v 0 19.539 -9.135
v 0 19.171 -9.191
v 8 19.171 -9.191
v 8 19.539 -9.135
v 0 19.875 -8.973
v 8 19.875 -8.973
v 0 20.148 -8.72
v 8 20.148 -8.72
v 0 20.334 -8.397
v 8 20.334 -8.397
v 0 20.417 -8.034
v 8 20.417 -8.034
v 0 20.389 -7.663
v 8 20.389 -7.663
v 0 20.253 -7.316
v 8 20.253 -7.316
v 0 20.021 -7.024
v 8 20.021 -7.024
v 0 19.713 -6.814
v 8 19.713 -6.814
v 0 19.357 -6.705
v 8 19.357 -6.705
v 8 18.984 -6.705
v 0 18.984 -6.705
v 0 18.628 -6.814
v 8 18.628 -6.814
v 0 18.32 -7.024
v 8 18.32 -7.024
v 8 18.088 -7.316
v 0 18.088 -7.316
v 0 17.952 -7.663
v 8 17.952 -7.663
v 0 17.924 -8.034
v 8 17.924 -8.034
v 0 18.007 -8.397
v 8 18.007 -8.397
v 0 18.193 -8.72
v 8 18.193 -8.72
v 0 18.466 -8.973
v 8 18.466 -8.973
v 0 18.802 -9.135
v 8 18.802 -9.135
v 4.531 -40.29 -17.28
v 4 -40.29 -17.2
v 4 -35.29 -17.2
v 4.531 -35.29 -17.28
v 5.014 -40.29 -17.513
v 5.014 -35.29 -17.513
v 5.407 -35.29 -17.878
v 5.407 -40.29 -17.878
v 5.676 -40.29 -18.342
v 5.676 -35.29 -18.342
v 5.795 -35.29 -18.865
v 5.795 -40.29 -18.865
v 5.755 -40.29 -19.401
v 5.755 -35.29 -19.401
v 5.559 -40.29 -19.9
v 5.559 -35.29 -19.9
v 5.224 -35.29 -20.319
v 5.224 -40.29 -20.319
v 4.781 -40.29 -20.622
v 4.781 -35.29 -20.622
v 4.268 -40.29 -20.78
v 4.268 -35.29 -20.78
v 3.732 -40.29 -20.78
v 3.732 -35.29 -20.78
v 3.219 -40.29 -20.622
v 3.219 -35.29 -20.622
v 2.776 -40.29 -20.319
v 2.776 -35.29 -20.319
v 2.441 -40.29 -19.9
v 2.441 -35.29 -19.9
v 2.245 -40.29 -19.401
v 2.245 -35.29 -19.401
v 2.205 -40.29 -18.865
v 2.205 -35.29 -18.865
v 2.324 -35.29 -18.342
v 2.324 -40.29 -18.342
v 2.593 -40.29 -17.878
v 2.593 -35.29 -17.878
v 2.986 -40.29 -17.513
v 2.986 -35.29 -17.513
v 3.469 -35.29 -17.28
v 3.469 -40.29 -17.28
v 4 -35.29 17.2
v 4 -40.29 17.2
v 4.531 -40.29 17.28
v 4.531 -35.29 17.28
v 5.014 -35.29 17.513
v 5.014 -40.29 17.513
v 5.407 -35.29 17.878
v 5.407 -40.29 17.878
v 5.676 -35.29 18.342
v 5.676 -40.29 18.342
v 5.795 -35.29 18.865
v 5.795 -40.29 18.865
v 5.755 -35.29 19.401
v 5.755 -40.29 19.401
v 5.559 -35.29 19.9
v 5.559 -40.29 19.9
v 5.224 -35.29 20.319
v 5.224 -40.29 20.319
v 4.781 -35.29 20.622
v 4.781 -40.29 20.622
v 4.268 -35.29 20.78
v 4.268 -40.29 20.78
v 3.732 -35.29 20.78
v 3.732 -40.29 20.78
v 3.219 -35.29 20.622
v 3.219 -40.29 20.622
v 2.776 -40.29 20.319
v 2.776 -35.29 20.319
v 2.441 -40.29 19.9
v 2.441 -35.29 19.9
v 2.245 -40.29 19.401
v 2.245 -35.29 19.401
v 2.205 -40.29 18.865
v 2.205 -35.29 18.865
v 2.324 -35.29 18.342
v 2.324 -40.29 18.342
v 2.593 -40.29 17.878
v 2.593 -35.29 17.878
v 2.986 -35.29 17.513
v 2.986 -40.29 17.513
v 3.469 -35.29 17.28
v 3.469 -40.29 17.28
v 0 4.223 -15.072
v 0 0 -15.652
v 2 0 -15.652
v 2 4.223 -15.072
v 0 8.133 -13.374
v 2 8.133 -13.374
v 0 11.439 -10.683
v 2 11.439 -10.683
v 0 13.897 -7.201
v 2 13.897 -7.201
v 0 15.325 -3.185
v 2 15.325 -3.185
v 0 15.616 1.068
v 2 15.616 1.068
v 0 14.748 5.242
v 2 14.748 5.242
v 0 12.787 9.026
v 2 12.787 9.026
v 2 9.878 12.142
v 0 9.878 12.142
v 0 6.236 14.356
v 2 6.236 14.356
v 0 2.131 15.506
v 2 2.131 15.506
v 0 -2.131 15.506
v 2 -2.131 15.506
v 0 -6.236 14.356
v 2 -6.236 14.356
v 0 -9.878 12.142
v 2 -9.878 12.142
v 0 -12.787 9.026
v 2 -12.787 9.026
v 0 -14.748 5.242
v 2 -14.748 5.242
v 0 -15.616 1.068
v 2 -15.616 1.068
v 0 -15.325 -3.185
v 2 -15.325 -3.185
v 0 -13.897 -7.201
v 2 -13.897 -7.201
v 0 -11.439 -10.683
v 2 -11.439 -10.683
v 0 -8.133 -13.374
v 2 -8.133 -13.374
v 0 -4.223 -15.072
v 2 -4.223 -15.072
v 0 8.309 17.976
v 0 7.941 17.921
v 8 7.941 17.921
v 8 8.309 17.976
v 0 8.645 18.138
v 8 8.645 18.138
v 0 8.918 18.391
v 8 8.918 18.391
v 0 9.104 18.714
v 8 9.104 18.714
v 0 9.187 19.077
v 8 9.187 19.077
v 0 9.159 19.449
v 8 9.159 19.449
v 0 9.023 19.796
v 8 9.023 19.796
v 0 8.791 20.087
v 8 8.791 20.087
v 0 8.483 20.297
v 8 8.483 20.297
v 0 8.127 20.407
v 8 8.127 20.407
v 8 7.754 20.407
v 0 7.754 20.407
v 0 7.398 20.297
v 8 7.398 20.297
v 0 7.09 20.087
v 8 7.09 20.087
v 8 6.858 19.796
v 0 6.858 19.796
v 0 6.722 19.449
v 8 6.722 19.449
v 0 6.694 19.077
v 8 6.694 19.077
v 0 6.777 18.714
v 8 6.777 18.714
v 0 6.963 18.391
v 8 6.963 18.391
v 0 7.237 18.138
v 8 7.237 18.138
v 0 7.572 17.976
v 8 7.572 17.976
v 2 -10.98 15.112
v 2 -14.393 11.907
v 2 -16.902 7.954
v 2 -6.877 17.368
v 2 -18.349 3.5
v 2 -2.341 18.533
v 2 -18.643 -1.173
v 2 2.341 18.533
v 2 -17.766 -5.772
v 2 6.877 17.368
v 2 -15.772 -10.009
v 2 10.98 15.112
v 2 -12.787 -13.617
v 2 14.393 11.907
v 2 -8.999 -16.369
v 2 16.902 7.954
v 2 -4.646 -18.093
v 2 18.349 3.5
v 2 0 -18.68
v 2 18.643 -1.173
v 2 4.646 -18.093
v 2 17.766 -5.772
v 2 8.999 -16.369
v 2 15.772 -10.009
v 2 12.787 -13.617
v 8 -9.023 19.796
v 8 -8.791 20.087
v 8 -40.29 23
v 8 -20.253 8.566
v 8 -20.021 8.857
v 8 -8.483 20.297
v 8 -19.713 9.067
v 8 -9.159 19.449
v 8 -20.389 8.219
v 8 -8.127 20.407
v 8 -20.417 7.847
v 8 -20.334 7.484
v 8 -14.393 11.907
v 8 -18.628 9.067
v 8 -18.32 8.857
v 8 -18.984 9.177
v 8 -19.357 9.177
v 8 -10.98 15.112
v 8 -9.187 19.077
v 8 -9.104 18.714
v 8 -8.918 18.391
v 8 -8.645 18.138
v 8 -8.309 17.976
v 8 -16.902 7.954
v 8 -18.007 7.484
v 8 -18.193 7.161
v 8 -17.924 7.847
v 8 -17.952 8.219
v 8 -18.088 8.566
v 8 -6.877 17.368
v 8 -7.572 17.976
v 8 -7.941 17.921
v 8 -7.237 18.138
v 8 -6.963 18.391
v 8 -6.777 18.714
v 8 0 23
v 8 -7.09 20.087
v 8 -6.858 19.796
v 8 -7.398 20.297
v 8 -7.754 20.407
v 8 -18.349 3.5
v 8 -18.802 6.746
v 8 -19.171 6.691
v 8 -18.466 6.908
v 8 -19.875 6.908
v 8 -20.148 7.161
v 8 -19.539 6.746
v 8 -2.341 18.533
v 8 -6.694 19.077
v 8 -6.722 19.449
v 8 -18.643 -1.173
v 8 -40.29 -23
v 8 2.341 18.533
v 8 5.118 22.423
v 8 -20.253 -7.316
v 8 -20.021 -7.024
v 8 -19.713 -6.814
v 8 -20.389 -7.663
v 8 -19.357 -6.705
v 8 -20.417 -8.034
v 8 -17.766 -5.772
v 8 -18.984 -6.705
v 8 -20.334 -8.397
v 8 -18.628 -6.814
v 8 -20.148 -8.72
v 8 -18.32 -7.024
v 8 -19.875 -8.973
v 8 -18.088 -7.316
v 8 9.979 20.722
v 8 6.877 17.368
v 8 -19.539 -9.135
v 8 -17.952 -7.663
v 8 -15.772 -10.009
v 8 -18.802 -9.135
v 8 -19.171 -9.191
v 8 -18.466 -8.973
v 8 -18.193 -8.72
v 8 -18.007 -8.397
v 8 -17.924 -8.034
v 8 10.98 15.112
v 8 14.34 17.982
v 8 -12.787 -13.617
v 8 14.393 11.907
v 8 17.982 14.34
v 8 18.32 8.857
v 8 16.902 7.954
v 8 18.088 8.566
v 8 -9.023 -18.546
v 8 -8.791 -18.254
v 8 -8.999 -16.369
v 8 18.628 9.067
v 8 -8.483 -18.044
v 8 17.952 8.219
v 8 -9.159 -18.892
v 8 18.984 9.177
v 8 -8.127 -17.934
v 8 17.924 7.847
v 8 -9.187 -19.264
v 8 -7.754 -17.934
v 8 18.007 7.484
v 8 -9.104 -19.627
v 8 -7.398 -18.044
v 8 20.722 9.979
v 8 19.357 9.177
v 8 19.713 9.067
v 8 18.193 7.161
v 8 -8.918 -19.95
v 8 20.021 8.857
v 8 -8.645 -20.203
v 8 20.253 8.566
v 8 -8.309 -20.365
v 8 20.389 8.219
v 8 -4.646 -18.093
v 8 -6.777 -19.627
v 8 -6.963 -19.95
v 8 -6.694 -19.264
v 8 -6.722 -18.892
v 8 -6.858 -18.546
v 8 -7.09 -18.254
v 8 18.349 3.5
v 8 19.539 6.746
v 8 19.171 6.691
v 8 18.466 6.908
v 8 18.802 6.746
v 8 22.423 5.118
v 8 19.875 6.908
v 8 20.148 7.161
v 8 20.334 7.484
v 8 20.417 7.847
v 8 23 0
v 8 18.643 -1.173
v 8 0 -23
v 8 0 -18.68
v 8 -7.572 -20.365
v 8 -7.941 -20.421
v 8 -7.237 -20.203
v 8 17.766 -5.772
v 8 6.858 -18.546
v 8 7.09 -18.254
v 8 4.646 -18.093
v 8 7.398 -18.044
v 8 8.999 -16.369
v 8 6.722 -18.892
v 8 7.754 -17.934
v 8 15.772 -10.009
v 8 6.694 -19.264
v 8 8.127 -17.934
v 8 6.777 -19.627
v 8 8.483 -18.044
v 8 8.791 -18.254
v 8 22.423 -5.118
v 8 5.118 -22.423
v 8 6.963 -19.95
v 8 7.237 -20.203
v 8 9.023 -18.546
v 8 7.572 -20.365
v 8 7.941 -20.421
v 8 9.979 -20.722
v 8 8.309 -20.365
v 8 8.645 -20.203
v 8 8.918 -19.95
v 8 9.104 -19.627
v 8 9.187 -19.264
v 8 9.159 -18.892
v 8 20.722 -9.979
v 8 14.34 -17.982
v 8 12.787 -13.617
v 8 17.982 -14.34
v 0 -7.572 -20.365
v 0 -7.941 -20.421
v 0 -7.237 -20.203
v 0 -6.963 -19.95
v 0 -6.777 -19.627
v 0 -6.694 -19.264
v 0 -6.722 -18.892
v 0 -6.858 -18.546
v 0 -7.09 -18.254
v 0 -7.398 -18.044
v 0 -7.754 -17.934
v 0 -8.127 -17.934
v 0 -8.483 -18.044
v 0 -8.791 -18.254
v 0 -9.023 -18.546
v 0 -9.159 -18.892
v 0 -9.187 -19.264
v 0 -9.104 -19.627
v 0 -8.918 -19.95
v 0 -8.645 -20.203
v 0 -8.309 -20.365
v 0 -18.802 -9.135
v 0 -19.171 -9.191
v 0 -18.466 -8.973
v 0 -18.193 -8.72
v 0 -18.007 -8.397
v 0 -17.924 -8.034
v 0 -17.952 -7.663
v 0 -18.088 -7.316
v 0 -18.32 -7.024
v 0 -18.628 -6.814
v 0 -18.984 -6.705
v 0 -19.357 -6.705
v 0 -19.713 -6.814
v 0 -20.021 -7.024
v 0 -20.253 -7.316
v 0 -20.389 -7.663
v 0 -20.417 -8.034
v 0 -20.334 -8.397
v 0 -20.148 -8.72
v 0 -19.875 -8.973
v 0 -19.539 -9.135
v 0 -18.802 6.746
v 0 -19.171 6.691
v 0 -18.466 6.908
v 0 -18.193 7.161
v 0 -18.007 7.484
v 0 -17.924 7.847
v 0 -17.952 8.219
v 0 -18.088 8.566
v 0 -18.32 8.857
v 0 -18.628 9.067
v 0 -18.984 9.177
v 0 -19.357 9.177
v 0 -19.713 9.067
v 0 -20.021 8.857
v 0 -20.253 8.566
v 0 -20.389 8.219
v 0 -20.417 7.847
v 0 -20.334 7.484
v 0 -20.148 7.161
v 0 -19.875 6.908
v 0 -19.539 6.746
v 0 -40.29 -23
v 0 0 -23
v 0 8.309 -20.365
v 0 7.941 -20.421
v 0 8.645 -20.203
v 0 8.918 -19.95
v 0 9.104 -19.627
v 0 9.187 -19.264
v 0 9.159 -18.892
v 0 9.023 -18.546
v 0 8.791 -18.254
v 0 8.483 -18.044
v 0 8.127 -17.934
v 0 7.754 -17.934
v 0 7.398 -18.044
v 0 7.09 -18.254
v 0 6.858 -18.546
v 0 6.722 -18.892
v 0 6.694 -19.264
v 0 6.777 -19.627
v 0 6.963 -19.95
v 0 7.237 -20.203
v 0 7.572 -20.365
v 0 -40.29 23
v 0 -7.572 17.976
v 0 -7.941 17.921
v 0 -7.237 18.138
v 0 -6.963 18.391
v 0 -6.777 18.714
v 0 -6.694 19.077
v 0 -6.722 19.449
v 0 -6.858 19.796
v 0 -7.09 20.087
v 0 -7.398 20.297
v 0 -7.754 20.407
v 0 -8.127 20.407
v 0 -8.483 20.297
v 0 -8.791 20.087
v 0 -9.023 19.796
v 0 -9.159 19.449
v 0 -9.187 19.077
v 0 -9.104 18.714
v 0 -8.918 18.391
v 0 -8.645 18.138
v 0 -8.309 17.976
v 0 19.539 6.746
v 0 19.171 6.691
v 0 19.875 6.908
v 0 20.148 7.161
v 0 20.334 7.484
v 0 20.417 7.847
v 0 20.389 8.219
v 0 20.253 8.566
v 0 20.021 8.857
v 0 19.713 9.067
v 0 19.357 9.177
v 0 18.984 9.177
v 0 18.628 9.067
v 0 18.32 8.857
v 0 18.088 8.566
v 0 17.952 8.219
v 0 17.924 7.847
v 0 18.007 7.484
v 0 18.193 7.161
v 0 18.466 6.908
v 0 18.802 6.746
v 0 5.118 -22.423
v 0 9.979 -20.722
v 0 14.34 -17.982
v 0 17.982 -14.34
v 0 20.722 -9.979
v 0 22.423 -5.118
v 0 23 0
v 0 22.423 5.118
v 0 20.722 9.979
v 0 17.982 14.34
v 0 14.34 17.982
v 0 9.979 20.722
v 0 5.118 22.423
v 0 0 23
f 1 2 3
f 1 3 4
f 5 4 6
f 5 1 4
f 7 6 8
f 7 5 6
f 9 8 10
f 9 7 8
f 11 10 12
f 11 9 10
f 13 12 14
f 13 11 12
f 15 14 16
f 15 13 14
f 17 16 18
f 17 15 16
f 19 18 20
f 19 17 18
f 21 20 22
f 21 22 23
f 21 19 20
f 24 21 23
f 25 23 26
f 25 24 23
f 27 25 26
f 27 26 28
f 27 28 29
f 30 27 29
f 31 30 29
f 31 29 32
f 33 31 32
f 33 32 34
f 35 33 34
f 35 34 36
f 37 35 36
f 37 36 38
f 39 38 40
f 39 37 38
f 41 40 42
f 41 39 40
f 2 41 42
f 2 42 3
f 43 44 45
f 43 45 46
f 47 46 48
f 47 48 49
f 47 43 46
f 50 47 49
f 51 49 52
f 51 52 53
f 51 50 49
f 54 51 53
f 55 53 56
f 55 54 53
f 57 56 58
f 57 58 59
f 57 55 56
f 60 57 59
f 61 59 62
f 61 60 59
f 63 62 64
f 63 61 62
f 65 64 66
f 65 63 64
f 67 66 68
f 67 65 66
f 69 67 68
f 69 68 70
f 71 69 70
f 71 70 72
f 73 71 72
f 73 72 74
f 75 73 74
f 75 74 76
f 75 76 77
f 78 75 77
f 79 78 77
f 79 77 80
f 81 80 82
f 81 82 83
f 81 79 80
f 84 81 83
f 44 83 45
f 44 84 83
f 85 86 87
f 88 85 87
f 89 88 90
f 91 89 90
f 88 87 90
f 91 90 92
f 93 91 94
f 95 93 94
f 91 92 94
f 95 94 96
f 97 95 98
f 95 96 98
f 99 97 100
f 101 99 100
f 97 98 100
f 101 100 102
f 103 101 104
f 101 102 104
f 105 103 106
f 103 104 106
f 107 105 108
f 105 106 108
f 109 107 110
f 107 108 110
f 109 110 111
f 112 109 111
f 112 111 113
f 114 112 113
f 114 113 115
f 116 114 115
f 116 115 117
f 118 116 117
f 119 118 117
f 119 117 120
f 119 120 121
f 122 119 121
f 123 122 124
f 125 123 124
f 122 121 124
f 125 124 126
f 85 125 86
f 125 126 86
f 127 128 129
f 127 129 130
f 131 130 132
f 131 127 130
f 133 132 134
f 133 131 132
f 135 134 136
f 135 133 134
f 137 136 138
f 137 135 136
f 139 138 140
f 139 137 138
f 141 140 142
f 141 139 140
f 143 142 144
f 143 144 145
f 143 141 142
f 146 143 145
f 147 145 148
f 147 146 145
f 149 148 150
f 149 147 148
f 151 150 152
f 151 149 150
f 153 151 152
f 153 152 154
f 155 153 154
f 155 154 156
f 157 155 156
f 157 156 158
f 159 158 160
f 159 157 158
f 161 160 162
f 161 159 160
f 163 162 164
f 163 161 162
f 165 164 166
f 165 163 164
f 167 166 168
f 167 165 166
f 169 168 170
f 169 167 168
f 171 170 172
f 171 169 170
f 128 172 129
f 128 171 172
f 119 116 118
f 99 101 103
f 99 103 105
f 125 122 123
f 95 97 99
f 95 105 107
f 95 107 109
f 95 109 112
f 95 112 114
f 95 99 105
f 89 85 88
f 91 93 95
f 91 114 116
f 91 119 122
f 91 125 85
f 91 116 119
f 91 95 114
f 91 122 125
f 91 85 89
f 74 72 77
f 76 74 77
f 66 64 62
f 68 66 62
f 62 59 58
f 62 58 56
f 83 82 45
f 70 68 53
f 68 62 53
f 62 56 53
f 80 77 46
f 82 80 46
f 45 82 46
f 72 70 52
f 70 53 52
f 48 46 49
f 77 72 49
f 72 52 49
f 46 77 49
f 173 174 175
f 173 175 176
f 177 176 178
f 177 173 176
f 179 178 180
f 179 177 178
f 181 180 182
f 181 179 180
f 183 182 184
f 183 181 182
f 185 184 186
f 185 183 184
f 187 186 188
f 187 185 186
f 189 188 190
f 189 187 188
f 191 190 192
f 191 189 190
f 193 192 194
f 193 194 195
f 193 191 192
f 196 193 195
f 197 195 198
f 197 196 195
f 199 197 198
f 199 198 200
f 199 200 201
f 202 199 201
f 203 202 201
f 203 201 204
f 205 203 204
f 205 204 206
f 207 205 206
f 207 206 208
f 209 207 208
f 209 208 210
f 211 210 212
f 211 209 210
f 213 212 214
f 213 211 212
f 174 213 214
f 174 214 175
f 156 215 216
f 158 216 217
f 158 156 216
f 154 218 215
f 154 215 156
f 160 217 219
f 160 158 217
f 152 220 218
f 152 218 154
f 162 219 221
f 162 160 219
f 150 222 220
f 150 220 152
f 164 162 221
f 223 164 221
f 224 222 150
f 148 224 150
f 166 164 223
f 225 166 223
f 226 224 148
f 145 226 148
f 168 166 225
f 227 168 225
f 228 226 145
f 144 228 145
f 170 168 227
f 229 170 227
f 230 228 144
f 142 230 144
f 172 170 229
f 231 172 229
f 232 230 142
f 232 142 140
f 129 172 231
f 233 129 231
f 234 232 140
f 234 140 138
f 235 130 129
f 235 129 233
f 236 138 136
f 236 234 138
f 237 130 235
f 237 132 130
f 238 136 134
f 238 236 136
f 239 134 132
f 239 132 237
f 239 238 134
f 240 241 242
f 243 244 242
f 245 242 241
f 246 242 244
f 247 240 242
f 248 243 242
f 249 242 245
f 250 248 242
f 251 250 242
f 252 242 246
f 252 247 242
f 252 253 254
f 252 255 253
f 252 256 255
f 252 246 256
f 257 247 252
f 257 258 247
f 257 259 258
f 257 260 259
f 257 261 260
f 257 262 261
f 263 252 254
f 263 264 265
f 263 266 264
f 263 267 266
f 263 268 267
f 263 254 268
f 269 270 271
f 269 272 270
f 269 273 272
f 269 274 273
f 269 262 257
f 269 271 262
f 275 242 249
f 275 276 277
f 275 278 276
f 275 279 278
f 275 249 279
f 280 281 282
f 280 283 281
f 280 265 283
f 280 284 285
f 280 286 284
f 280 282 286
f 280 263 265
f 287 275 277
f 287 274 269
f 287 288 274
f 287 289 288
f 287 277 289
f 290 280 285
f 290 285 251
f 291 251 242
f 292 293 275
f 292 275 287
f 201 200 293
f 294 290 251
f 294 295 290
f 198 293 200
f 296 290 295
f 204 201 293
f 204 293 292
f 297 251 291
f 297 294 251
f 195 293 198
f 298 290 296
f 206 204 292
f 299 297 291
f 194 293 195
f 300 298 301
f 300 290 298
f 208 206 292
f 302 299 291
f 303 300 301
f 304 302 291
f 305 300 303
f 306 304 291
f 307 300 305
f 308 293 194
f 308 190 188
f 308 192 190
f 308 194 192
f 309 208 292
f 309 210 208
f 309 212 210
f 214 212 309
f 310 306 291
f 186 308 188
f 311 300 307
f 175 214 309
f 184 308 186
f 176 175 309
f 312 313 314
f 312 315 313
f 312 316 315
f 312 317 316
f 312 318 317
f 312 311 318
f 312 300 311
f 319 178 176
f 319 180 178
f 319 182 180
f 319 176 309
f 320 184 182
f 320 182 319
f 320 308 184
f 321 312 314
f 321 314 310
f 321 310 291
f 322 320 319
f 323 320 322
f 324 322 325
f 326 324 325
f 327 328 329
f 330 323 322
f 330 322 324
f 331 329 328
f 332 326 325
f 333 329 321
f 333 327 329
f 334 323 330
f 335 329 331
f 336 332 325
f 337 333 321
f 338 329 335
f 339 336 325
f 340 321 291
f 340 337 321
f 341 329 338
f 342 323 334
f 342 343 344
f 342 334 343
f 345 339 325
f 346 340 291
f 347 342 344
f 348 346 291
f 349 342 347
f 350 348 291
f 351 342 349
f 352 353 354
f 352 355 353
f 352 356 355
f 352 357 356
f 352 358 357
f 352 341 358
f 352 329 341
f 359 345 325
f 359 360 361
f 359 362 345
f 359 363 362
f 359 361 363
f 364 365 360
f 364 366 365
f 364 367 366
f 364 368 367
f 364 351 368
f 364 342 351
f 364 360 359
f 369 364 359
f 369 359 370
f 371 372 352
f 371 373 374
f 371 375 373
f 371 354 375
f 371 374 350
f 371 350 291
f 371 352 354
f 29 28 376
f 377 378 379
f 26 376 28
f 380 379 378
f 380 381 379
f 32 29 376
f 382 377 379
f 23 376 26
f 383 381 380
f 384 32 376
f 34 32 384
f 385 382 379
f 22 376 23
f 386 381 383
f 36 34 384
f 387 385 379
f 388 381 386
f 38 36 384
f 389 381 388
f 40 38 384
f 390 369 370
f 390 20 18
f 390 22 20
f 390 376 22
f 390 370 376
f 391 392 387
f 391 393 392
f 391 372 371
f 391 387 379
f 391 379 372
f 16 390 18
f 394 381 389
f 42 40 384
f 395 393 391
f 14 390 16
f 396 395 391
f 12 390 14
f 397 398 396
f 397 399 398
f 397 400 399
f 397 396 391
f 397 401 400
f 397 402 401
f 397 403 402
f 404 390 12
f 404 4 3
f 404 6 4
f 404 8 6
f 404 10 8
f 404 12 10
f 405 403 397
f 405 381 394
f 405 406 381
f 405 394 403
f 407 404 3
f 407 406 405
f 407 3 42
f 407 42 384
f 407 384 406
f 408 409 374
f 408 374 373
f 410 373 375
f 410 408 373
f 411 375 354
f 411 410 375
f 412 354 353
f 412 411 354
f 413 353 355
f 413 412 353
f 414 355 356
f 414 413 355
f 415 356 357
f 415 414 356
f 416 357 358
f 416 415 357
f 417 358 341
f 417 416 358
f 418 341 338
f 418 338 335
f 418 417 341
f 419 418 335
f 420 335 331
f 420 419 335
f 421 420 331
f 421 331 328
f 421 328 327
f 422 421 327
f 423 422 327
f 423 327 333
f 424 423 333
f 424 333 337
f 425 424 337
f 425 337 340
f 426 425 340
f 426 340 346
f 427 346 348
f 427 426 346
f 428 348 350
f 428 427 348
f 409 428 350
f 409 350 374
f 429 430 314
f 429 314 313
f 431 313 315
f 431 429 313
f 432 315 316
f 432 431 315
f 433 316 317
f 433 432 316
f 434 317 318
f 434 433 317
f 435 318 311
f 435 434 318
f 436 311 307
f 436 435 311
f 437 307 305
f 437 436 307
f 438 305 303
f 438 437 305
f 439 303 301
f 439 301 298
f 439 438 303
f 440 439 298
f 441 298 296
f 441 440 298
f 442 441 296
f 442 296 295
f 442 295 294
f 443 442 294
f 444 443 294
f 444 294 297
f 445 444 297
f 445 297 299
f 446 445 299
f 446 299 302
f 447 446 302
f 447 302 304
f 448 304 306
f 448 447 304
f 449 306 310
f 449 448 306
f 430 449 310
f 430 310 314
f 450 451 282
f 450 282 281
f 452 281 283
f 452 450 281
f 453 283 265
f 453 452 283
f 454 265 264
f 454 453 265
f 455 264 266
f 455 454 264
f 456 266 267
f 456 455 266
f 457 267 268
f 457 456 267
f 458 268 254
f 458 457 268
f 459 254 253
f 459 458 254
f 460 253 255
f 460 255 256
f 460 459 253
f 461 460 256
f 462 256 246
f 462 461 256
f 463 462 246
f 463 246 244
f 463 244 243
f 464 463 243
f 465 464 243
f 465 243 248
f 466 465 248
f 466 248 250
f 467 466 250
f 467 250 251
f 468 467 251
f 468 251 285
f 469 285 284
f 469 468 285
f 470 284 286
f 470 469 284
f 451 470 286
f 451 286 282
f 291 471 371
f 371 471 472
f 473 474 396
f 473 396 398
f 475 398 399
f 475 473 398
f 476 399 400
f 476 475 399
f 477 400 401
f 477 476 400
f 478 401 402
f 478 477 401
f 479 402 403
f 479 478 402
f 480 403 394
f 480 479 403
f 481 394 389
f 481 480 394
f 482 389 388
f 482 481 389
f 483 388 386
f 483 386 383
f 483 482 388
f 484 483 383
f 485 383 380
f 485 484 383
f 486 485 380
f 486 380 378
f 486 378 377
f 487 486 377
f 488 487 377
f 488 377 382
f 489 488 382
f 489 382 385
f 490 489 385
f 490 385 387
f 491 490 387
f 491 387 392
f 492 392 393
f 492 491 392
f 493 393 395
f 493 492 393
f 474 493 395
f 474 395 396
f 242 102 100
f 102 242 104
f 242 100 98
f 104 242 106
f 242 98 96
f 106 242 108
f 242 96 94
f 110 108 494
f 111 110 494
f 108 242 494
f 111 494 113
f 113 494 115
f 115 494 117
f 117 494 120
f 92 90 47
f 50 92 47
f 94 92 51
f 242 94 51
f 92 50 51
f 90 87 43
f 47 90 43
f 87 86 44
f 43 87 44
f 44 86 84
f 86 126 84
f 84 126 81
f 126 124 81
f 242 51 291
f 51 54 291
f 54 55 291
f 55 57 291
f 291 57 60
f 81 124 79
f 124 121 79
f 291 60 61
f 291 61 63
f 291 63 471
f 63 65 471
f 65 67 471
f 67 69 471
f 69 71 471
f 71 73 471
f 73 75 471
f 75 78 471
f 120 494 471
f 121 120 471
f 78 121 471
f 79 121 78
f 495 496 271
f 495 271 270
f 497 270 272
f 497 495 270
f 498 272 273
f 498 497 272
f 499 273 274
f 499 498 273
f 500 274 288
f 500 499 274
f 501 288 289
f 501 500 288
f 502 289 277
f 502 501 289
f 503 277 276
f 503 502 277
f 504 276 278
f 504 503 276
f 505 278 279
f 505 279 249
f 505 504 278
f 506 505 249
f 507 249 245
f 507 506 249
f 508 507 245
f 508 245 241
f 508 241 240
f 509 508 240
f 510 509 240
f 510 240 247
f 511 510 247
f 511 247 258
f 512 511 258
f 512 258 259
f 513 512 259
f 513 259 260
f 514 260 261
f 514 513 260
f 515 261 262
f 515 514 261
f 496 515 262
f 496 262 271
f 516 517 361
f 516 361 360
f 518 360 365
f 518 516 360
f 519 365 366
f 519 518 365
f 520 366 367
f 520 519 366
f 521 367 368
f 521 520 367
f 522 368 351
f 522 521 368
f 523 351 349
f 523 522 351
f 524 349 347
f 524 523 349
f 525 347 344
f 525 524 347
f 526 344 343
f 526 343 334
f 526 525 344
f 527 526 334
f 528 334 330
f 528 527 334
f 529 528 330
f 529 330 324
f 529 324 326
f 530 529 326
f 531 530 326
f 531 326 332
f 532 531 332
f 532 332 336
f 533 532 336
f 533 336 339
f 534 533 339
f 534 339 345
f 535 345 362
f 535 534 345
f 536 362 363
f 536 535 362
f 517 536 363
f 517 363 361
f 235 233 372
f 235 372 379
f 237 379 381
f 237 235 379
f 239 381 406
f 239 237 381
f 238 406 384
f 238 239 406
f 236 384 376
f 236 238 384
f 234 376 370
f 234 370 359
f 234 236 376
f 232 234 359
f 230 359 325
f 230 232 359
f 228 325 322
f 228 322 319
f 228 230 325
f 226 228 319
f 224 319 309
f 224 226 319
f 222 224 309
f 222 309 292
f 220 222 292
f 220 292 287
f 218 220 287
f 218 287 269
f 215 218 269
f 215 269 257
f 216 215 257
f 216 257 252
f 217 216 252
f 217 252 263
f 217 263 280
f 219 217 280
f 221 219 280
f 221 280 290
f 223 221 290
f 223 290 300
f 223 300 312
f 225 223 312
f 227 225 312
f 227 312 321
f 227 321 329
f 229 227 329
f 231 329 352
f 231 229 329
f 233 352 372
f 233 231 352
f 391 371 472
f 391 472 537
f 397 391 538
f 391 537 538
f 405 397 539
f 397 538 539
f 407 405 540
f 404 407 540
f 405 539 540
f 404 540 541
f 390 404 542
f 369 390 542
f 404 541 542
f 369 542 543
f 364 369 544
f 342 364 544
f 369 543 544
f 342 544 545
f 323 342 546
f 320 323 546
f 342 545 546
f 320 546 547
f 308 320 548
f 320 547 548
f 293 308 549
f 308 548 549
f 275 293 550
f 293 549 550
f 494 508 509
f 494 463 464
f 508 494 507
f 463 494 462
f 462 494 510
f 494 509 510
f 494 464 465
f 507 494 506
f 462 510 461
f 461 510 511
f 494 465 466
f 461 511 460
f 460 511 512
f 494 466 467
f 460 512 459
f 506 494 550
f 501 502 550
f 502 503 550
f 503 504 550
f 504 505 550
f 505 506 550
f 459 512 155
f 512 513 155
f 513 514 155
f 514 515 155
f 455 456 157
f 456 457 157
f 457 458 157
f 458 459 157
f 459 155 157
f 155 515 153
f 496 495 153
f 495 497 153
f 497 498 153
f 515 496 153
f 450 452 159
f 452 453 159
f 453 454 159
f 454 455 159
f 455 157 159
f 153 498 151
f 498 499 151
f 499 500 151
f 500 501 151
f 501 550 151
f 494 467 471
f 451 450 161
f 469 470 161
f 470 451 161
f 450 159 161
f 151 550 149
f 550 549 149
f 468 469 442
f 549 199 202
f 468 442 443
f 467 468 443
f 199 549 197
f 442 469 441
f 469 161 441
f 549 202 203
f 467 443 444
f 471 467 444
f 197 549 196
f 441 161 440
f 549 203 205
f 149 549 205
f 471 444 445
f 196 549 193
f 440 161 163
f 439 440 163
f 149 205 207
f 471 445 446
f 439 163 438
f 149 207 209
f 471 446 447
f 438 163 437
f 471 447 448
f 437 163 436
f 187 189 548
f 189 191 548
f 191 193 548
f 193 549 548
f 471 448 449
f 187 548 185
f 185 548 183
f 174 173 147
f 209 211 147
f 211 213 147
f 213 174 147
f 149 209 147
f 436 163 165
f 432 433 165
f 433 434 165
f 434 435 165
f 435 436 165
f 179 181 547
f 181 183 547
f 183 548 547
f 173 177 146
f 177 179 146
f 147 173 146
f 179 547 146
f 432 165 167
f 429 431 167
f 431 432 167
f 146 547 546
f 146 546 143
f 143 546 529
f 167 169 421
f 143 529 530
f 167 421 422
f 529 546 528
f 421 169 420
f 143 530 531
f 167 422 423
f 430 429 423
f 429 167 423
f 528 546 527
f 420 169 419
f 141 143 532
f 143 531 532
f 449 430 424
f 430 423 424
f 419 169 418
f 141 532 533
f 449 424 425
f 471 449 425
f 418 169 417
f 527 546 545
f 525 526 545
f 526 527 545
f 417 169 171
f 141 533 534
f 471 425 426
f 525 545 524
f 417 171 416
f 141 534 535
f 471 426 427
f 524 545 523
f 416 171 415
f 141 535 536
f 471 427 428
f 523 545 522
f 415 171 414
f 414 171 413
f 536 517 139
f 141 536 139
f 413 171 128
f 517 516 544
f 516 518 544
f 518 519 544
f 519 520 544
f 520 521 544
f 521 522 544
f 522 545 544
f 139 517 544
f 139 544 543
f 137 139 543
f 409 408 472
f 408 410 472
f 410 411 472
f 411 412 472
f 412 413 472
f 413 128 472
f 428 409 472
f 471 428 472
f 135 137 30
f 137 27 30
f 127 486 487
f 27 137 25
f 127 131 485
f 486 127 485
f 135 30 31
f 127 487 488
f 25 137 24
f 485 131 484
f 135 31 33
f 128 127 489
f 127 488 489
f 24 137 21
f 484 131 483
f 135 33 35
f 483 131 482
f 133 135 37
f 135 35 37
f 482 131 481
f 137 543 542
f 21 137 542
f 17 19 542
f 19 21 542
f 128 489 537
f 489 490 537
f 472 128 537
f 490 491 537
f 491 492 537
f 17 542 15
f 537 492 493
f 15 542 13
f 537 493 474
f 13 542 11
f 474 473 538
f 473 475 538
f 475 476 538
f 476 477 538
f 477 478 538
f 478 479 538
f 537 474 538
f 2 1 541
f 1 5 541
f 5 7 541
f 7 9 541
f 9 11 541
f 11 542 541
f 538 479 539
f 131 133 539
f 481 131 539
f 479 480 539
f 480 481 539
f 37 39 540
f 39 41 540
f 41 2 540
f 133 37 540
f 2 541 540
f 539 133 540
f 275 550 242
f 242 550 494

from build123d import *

# Parameters (mm, degrees)
SKETCH_1_R          = 18.68
SKETCH_1_R_2        = 15.652173913
EXTRUDE_2_DEPTH     = 2
SKETCH_1_4_R        = 23
SKETCH_1_4_R_2      = 1.25
SKETCH_1_4_R_3      = 18.68
EXTRUDE_3_DEPTH     = 8
EXTRUDE_4_DEPTH     = 8
SKETCH_3_R          = 1.8
CUT_EXTRUDE_1_DEPTH = 5


with BuildPart() as part:
    # 草图1 → 凸台-拉伸2 (new body)
    with BuildSketch(Plane(origin=(0, 0, 0), x_dir=(0, 0, -1), z_dir=(1, 0, 0))):
        Circle(SKETCH_1_R)
        Circle(SKETCH_1_R_2, mode=Mode.SUBTRACT)
    extrude(amount=EXTRUDE_2_DEPTH)

    # 草图1<4> → 凸台-拉伸3 (add)
    with BuildSketch(Plane(origin=(0, 0, 0), x_dir=(0, 0, -1), z_dir=(1, 0, 0))):
        Circle(SKETCH_1_4_R)
        with Locations((-7.940681222, -19.1705003)):
            Circle(SKETCH_1_4_R_2, mode=Mode.SUBTRACT)
        with Locations((-19.1705003, -7.940681222)):
            Circle(SKETCH_1_4_R_2, mode=Mode.SUBTRACT)
        with Locations((7.940681222, -19.1705003)):
            Circle(SKETCH_1_4_R_2, mode=Mode.SUBTRACT)
        with Locations((19.1705003, -7.940681222)):
            Circle(SKETCH_1_4_R_2, mode=Mode.SUBTRACT)
        with Locations((-19.1705003, 7.940681222)):
            Circle(SKETCH_1_4_R_2, mode=Mode.SUBTRACT)
        with Locations((-7.940681222, 19.1705003)):
            Circle(SKETCH_1_4_R_2, mode=Mode.SUBTRACT)
        Circle(SKETCH_1_4_R_3, mode=Mode.SUBTRACT)
        with Locations((19.1705003, 7.940681222)):
            Circle(SKETCH_1_4_R_2, mode=Mode.SUBTRACT)
        with Locations((7.940681222, 19.1705003)):
            Circle(SKETCH_1_4_R_2, mode=Mode.SUBTRACT)
    extrude(amount=EXTRUDE_3_DEPTH)

    # 草图2 → 凸台-拉伸4 (add)
    with BuildSketch(Plane.ZY):
        with BuildLine():
            Line((-23, -40.29), (-23, 0))
            ThreePointArc((-23, 0), (0, -23), (23, 0))
            Line((23, 0), (23, -40.29))
            Line((23, -40.29), (-23, -40.29))
        make_face()
    extrude(amount=-EXTRUDE_4_DEPTH)

    # 草图3 → 切除-拉伸1 (cut)
    with BuildSketch(Plane.XZ.offset(40.29)):
        with Locations((4, 19)):
            Circle(SKETCH_3_R)
    cut_extrude_1 = extrude(amount=-CUT_EXTRUDE_1_DEPTH, mode=Mode.SUBTRACT)

    # 镜向1: 切除-拉伸1 across plane
    add(cut_extrude_1.mirror(Plane(origin=(0, 0, 0), x_dir=(1, 0, 0), z_dir=(0, 0, -1))), mode=Mode.SUBTRACT)


solid = part.part
